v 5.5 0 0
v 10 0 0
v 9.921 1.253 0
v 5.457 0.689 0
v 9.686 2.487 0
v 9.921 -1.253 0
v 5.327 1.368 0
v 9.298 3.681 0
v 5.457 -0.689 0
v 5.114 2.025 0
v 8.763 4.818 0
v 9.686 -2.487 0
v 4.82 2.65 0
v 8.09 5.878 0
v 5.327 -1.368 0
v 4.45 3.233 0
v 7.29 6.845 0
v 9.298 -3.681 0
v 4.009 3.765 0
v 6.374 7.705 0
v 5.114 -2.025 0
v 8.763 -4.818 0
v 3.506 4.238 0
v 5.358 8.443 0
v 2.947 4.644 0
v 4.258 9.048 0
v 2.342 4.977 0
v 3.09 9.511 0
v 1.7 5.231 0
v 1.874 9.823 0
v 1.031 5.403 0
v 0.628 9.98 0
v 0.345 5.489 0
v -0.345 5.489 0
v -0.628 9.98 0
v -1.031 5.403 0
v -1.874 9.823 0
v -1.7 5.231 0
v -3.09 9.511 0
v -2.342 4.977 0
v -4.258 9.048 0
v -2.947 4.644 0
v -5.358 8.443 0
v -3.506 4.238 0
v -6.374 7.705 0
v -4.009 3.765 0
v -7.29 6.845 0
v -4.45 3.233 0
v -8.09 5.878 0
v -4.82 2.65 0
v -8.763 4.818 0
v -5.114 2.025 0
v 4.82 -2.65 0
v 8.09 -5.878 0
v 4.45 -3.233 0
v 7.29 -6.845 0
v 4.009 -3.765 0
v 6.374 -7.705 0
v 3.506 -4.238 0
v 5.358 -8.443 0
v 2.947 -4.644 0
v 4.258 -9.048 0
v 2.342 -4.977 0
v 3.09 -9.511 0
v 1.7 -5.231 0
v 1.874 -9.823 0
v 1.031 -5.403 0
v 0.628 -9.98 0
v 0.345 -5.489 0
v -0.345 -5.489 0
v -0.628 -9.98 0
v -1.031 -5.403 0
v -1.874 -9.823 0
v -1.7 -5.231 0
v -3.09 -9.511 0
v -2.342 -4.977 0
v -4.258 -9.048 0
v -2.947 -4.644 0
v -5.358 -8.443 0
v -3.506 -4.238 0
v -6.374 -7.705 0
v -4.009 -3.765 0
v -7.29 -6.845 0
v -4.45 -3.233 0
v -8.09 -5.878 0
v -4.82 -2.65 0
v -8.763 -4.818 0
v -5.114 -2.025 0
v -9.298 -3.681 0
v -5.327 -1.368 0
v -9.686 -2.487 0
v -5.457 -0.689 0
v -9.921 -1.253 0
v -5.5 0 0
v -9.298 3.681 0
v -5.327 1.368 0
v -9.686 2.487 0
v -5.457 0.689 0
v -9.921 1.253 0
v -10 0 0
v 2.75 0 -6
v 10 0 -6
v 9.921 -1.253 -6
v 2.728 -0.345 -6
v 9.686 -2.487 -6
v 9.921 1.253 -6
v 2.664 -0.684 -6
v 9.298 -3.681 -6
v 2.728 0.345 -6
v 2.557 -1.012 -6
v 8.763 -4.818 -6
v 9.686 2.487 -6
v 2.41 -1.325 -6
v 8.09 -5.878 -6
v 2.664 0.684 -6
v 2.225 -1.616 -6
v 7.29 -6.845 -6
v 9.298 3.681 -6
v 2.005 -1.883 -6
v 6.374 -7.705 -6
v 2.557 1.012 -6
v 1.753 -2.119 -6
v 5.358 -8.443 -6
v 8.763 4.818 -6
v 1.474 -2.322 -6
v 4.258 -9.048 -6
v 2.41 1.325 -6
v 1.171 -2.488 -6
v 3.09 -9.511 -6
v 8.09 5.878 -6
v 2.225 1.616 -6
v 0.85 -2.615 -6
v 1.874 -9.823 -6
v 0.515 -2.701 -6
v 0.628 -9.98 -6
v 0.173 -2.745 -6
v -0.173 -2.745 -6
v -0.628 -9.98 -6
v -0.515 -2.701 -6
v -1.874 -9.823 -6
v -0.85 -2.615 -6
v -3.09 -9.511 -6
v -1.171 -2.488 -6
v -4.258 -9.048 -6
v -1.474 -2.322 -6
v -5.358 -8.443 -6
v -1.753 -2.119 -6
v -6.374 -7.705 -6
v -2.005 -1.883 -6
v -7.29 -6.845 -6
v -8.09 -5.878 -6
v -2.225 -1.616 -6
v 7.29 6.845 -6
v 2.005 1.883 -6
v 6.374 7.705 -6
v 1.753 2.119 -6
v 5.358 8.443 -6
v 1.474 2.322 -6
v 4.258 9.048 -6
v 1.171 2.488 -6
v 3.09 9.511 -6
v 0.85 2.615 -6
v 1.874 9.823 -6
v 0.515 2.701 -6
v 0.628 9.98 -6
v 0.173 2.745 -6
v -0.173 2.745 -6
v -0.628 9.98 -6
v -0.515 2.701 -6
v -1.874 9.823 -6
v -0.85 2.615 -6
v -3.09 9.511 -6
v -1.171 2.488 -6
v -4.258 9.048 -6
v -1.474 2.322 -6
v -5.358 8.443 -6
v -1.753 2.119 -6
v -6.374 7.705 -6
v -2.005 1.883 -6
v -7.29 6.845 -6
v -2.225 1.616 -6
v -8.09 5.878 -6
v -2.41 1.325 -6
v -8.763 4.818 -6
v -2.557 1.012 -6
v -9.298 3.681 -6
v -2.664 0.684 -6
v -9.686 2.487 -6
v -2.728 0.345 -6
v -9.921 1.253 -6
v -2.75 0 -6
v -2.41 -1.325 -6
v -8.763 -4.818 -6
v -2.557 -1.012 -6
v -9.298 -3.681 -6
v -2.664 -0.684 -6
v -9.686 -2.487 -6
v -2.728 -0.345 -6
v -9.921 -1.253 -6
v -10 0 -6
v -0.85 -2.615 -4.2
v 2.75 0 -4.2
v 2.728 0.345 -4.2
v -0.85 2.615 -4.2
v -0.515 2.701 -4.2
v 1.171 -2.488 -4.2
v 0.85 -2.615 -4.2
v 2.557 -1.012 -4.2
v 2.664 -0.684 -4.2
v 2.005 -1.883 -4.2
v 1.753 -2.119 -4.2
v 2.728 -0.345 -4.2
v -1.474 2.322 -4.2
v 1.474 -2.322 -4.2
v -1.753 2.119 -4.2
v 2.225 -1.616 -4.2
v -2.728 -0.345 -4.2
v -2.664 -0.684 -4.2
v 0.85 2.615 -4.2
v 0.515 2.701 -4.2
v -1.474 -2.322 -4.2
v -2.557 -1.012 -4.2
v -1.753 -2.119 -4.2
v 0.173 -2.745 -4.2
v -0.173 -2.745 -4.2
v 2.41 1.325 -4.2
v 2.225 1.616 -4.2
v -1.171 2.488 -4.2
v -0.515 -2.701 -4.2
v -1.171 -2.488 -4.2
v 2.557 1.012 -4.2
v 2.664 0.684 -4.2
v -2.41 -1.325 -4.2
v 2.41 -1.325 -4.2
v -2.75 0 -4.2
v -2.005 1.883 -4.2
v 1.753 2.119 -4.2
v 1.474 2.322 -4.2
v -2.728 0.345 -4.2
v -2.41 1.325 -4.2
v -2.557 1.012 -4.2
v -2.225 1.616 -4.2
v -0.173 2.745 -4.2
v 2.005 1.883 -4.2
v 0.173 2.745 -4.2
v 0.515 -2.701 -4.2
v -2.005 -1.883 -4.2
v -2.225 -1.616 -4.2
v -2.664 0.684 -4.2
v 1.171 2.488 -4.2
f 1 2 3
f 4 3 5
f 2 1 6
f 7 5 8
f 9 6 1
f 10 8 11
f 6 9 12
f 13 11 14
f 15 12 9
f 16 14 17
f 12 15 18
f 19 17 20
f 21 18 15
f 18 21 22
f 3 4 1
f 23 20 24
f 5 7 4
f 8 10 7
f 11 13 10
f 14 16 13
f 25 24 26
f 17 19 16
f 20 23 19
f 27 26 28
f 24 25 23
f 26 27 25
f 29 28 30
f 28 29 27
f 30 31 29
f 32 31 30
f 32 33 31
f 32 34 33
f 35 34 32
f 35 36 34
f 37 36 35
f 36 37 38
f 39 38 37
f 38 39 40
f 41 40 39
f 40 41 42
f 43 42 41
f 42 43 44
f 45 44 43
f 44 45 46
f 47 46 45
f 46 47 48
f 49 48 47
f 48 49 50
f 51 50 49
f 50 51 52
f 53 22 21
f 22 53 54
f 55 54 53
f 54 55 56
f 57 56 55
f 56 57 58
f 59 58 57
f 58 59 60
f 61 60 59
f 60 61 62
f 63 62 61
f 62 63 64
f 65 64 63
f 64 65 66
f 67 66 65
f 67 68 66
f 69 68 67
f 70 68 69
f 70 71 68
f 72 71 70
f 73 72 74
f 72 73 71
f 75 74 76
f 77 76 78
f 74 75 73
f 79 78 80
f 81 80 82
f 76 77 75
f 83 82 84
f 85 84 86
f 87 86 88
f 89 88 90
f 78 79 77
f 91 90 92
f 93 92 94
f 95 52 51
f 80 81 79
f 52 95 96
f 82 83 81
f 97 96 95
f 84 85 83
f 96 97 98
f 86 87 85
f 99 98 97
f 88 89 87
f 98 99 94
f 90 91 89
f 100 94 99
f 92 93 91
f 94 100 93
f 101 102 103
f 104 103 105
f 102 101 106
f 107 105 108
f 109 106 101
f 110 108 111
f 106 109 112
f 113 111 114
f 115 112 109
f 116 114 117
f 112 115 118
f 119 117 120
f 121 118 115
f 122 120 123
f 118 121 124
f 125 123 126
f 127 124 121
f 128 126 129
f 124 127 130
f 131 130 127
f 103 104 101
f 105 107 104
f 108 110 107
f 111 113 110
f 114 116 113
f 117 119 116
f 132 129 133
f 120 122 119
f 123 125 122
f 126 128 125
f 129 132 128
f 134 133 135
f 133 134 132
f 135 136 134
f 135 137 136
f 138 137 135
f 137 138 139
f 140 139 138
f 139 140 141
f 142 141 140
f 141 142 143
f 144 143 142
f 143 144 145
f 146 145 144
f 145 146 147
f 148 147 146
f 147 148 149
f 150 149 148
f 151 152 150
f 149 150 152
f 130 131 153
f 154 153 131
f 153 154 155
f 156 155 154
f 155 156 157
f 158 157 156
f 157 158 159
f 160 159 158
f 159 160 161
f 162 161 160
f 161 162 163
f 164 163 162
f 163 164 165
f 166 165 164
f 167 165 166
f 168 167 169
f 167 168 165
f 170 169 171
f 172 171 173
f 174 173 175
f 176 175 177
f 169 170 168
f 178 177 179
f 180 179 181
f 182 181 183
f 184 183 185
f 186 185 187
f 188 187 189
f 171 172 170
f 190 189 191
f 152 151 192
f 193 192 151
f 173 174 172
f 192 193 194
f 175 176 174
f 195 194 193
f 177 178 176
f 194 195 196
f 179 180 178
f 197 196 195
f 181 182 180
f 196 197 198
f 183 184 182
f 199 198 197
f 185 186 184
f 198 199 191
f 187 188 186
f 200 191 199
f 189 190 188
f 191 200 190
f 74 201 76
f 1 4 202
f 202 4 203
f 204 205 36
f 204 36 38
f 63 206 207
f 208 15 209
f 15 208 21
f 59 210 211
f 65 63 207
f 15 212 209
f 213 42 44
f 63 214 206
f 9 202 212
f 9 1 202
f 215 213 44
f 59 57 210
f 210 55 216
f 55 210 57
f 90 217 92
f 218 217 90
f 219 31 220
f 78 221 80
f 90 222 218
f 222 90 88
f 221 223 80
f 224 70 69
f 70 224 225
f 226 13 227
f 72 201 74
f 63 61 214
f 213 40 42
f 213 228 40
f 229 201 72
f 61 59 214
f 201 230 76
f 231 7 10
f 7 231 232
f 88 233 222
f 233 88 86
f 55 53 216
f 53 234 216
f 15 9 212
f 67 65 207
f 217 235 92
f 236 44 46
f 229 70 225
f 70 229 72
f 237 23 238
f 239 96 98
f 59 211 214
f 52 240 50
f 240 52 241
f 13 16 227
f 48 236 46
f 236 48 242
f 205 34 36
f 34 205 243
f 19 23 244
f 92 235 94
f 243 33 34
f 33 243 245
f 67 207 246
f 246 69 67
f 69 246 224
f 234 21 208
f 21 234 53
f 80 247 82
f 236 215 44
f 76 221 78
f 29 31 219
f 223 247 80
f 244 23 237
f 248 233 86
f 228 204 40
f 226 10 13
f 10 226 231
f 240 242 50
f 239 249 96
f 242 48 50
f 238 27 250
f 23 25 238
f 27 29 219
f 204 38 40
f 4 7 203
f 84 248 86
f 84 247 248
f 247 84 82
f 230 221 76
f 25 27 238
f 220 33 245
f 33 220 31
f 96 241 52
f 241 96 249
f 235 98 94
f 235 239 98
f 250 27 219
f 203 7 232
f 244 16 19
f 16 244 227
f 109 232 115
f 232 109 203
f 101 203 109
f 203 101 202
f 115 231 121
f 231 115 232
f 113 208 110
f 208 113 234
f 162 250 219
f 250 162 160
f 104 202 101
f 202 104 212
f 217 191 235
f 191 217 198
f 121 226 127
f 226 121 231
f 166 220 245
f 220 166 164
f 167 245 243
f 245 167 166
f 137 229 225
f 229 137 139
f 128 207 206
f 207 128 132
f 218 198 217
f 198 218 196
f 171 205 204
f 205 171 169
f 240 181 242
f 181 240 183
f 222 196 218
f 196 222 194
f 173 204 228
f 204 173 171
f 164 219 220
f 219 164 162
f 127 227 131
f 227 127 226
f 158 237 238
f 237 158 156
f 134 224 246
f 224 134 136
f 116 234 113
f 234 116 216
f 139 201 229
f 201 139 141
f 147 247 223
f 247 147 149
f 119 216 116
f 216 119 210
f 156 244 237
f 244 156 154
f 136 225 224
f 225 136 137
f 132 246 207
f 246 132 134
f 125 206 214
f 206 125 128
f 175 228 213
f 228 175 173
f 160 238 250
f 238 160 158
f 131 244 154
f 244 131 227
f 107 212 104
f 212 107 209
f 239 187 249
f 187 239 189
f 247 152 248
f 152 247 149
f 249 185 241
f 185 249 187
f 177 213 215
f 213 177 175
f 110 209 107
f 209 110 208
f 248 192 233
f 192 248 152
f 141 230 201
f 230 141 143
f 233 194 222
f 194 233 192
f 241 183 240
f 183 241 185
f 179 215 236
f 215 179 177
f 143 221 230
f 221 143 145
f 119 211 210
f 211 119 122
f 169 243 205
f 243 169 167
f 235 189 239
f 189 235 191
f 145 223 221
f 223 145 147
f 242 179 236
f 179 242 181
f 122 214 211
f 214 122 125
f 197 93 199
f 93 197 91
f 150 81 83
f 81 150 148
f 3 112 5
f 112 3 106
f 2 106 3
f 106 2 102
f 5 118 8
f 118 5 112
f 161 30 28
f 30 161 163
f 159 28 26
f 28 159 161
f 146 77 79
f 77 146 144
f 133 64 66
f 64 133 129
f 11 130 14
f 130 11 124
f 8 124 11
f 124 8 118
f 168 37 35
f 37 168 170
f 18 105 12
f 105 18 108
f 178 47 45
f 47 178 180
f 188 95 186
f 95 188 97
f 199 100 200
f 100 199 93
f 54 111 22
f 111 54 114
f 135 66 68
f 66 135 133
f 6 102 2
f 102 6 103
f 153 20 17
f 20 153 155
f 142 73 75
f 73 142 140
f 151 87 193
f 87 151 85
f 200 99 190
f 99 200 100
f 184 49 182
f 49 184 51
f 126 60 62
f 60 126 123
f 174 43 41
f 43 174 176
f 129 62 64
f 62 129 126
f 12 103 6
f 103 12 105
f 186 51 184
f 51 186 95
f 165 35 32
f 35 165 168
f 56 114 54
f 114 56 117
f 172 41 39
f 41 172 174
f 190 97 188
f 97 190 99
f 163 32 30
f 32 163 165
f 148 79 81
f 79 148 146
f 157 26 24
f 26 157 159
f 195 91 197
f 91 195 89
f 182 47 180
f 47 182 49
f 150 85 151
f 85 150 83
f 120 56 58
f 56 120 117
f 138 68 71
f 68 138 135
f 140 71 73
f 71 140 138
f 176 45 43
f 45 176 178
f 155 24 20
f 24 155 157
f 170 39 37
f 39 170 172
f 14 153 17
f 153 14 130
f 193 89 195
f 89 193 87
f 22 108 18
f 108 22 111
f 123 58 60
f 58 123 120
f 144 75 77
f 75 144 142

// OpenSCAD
$fn = 50;


difference() {
	union() {
		translate(v = [0, 0, -6.0000000000]) {
			cylinder(h = 6, r = 10.0000000000);
		}
		cylinder(h = 0, r = 16.0000000000);
	}
	union() {
		translate(v = [0, 0, 0]) {
			rotate(a = [0, 0, 0]) {
				difference() {
					union() {
						#translate(v = [0, 0, -6.0000000000]) {
							cylinder(h = 6, r = 2.2500000000);
						}
						#translate(v = [0, 0, -4.2000000000]) {
							cylinder(h = 4.2000000000, r = 10.0000000000, r1 = 2.7500000000, r2 = 5.5000000000);
						}
						#translate(v = [0, 0, -6.0000000000]) {
							cylinder(h = 6, r = 2.7500000000);
						}
						#translate(v = [0, 0, -6.0000000000]) {
							cylinder(h = 6, r = 2.2500000000);
						}
					}
					union();
				}
			}
		}
	}
}
